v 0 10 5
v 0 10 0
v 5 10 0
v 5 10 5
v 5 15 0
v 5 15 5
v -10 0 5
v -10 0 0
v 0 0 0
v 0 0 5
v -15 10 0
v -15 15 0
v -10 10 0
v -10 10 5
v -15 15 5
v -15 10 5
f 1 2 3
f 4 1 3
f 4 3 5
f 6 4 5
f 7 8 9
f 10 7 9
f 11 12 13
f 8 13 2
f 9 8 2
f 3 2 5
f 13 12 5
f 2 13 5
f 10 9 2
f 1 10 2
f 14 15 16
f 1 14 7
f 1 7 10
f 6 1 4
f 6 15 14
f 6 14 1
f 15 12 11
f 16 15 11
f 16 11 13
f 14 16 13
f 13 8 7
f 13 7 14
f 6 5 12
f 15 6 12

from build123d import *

# Parameters (mm, degrees)
SKETCH1_W           = 10
SKETCH1_H           = 10
BOSS_EXTRUDE1_DEPTH = 5


with BuildPart() as part:
    # Sketch1 → Boss-Extrude1 (new body)
    with BuildSketch(Plane.XY):
        Polygon((-10, 10), (0, 10), (5, 10), (5, 15), (-15, 15), (-15, 10), align=None)
        with Locations((-5, 5)):
            Rectangle(SKETCH1_W, SKETCH1_H)
    extrude(amount=BOSS_EXTRUDE1_DEPTH)


solid = part.part
